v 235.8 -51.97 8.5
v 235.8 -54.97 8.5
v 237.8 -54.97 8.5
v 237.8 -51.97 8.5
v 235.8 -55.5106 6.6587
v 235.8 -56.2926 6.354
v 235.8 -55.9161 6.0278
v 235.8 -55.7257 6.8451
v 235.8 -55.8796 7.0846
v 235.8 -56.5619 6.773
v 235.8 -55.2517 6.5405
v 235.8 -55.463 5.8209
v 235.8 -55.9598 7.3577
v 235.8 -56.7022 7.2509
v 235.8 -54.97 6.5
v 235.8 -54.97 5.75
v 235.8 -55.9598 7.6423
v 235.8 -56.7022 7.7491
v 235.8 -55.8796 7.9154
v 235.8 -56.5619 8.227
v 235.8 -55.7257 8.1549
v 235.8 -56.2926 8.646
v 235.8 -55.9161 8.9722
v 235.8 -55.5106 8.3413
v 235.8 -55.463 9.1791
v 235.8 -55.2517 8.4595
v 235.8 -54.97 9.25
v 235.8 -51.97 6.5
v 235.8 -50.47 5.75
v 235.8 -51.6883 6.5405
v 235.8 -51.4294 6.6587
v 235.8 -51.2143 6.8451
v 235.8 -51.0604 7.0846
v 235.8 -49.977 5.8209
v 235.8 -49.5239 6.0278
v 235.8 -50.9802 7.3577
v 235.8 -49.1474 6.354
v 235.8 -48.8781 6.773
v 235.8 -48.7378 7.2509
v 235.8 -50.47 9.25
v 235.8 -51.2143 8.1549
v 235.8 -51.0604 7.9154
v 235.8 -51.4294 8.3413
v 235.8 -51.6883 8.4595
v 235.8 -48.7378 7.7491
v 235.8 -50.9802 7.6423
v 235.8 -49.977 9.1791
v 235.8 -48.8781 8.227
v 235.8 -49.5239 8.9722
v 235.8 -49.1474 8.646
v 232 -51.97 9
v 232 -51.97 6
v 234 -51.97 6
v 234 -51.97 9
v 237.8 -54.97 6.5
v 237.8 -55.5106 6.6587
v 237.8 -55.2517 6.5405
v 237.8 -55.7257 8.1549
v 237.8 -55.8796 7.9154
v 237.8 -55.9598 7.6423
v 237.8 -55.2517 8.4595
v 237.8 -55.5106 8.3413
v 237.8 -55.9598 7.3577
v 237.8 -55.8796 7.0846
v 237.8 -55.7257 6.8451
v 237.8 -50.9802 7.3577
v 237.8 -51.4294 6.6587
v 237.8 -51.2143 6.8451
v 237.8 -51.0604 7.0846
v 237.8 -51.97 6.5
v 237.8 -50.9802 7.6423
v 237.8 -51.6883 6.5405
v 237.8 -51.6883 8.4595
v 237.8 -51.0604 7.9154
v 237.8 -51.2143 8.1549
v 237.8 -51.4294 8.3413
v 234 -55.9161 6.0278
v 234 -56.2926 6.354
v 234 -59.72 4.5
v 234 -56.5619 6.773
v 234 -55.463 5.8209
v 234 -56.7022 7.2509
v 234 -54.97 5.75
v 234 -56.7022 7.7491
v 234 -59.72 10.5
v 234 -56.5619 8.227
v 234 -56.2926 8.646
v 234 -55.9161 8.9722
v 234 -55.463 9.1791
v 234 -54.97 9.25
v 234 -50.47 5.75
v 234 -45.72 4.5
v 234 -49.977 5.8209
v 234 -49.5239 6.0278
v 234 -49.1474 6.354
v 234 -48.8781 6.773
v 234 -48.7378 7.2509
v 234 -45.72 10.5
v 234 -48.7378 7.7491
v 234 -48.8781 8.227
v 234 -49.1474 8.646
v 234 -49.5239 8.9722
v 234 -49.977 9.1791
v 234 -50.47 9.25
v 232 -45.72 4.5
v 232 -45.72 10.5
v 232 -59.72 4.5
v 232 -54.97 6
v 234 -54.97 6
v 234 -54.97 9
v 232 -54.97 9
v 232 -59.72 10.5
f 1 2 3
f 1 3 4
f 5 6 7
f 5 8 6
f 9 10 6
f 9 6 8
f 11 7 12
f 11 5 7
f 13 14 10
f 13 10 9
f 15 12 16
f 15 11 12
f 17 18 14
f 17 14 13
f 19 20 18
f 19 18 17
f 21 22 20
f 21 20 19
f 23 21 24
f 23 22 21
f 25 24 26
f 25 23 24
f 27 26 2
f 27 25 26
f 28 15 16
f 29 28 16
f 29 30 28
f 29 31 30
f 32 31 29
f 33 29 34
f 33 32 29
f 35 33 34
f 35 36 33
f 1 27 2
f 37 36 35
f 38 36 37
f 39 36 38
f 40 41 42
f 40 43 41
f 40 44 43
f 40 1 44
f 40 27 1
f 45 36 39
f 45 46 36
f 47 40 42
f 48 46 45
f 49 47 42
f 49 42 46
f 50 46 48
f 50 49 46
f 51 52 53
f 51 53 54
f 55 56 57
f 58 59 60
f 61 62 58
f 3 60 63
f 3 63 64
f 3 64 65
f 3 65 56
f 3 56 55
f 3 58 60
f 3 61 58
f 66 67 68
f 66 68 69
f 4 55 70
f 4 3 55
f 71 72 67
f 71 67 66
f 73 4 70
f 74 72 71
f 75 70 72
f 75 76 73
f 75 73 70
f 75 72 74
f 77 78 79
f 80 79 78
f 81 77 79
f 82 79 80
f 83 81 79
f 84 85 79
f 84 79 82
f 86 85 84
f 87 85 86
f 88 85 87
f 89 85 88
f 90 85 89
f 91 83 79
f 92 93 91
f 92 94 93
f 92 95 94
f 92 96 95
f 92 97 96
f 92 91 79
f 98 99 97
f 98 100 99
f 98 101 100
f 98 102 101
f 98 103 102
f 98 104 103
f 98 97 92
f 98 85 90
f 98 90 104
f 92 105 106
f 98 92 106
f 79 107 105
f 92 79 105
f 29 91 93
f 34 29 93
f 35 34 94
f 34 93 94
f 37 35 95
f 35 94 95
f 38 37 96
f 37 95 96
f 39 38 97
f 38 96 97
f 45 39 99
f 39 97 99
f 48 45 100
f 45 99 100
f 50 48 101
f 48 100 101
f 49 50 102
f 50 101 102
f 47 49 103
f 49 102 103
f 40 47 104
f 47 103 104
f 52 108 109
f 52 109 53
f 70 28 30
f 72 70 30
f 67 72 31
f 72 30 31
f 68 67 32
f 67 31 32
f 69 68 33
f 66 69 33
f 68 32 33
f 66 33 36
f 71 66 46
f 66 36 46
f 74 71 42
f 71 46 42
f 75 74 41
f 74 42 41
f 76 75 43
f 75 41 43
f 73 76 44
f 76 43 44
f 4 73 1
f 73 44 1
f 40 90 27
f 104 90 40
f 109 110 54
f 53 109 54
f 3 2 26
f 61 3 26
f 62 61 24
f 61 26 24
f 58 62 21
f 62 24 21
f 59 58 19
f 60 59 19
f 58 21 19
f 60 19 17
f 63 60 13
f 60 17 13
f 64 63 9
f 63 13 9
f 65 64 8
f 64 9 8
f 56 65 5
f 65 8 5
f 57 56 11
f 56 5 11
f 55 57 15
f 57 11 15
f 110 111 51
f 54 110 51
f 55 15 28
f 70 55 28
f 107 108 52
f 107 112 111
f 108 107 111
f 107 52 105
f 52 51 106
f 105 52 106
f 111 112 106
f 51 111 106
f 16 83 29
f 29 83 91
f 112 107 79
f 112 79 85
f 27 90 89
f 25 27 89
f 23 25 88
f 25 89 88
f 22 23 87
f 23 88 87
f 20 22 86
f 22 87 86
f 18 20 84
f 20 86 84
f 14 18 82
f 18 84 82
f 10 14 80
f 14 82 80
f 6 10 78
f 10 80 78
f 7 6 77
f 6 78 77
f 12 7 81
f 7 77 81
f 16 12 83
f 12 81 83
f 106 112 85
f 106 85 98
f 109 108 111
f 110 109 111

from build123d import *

# Parameters (mm, degrees)
SKETCH052_W     = 14
SKETCH052_H     = 6
PAD022_DEPTH    = 2
PAD023_DEPTH    = 1.8
PAD024_DEPTH    = 2
SKETCH056_W     = 3
SKETCH056_H     = 3
POCKET025_DEPTH = 2


with BuildPart() as part:
    # Sketch052 → Pad022 (new body)
    with BuildSketch(Plane(origin=(232, -0.5, 0.8), x_dir=(0, 1, 0), z_dir=(1, 0, 0))):
        with Locations((-52.22, 6.7)):
            Rectangle(SKETCH052_W, SKETCH052_H)
    extrude(amount=PAD022_DEPTH)

    # Sketch053 (on Face6 of Pad022) → Pad023 (join)
    with BuildSketch(Plane.YZ.offset(234)):
        with BuildLine():
            ThreePointArc((-54.97, 9.25), (-56.72, 7.5), (-54.97, 5.75))
            Line((-54.97, 5.75), (-50.47, 5.75))
            ThreePointArc((-50.47, 5.75), (-48.72, 7.5), (-50.47, 9.25))
            Line((-54.97, 9.25), (-50.47, 9.25))
        make_face()
    extrude(amount=PAD023_DEPTH)

    # Sketch054 (on Face11 of Pad023) → Pad024 (join)
    with BuildSketch(Plane.YZ.offset(235.8)):
        with BuildLine():
            ThreePointArc((-54.97, 8.5), (-55.97, 7.5), (-54.97, 6.5))
            Line((-54.97, 6.5), (-51.97, 6.5))
            ThreePointArc((-51.97, 6.5), (-50.97, 7.5), (-51.97, 8.5))
            Line((-54.97, 8.5), (-51.97, 8.5))
        make_face()
    extrude(amount=PAD024_DEPTH)

    # Sketch056 (on Face16 of Pad024) → Pocket025 (cut)
    with BuildSketch(Plane.YZ.offset(232)):
        with Locations((-53.47, 7.5)):
            Rectangle(SKETCH056_W, SKETCH056_H)
    extrude(amount=POCKET025_DEPTH, mode=Mode.SUBTRACT)


solid = part.part
